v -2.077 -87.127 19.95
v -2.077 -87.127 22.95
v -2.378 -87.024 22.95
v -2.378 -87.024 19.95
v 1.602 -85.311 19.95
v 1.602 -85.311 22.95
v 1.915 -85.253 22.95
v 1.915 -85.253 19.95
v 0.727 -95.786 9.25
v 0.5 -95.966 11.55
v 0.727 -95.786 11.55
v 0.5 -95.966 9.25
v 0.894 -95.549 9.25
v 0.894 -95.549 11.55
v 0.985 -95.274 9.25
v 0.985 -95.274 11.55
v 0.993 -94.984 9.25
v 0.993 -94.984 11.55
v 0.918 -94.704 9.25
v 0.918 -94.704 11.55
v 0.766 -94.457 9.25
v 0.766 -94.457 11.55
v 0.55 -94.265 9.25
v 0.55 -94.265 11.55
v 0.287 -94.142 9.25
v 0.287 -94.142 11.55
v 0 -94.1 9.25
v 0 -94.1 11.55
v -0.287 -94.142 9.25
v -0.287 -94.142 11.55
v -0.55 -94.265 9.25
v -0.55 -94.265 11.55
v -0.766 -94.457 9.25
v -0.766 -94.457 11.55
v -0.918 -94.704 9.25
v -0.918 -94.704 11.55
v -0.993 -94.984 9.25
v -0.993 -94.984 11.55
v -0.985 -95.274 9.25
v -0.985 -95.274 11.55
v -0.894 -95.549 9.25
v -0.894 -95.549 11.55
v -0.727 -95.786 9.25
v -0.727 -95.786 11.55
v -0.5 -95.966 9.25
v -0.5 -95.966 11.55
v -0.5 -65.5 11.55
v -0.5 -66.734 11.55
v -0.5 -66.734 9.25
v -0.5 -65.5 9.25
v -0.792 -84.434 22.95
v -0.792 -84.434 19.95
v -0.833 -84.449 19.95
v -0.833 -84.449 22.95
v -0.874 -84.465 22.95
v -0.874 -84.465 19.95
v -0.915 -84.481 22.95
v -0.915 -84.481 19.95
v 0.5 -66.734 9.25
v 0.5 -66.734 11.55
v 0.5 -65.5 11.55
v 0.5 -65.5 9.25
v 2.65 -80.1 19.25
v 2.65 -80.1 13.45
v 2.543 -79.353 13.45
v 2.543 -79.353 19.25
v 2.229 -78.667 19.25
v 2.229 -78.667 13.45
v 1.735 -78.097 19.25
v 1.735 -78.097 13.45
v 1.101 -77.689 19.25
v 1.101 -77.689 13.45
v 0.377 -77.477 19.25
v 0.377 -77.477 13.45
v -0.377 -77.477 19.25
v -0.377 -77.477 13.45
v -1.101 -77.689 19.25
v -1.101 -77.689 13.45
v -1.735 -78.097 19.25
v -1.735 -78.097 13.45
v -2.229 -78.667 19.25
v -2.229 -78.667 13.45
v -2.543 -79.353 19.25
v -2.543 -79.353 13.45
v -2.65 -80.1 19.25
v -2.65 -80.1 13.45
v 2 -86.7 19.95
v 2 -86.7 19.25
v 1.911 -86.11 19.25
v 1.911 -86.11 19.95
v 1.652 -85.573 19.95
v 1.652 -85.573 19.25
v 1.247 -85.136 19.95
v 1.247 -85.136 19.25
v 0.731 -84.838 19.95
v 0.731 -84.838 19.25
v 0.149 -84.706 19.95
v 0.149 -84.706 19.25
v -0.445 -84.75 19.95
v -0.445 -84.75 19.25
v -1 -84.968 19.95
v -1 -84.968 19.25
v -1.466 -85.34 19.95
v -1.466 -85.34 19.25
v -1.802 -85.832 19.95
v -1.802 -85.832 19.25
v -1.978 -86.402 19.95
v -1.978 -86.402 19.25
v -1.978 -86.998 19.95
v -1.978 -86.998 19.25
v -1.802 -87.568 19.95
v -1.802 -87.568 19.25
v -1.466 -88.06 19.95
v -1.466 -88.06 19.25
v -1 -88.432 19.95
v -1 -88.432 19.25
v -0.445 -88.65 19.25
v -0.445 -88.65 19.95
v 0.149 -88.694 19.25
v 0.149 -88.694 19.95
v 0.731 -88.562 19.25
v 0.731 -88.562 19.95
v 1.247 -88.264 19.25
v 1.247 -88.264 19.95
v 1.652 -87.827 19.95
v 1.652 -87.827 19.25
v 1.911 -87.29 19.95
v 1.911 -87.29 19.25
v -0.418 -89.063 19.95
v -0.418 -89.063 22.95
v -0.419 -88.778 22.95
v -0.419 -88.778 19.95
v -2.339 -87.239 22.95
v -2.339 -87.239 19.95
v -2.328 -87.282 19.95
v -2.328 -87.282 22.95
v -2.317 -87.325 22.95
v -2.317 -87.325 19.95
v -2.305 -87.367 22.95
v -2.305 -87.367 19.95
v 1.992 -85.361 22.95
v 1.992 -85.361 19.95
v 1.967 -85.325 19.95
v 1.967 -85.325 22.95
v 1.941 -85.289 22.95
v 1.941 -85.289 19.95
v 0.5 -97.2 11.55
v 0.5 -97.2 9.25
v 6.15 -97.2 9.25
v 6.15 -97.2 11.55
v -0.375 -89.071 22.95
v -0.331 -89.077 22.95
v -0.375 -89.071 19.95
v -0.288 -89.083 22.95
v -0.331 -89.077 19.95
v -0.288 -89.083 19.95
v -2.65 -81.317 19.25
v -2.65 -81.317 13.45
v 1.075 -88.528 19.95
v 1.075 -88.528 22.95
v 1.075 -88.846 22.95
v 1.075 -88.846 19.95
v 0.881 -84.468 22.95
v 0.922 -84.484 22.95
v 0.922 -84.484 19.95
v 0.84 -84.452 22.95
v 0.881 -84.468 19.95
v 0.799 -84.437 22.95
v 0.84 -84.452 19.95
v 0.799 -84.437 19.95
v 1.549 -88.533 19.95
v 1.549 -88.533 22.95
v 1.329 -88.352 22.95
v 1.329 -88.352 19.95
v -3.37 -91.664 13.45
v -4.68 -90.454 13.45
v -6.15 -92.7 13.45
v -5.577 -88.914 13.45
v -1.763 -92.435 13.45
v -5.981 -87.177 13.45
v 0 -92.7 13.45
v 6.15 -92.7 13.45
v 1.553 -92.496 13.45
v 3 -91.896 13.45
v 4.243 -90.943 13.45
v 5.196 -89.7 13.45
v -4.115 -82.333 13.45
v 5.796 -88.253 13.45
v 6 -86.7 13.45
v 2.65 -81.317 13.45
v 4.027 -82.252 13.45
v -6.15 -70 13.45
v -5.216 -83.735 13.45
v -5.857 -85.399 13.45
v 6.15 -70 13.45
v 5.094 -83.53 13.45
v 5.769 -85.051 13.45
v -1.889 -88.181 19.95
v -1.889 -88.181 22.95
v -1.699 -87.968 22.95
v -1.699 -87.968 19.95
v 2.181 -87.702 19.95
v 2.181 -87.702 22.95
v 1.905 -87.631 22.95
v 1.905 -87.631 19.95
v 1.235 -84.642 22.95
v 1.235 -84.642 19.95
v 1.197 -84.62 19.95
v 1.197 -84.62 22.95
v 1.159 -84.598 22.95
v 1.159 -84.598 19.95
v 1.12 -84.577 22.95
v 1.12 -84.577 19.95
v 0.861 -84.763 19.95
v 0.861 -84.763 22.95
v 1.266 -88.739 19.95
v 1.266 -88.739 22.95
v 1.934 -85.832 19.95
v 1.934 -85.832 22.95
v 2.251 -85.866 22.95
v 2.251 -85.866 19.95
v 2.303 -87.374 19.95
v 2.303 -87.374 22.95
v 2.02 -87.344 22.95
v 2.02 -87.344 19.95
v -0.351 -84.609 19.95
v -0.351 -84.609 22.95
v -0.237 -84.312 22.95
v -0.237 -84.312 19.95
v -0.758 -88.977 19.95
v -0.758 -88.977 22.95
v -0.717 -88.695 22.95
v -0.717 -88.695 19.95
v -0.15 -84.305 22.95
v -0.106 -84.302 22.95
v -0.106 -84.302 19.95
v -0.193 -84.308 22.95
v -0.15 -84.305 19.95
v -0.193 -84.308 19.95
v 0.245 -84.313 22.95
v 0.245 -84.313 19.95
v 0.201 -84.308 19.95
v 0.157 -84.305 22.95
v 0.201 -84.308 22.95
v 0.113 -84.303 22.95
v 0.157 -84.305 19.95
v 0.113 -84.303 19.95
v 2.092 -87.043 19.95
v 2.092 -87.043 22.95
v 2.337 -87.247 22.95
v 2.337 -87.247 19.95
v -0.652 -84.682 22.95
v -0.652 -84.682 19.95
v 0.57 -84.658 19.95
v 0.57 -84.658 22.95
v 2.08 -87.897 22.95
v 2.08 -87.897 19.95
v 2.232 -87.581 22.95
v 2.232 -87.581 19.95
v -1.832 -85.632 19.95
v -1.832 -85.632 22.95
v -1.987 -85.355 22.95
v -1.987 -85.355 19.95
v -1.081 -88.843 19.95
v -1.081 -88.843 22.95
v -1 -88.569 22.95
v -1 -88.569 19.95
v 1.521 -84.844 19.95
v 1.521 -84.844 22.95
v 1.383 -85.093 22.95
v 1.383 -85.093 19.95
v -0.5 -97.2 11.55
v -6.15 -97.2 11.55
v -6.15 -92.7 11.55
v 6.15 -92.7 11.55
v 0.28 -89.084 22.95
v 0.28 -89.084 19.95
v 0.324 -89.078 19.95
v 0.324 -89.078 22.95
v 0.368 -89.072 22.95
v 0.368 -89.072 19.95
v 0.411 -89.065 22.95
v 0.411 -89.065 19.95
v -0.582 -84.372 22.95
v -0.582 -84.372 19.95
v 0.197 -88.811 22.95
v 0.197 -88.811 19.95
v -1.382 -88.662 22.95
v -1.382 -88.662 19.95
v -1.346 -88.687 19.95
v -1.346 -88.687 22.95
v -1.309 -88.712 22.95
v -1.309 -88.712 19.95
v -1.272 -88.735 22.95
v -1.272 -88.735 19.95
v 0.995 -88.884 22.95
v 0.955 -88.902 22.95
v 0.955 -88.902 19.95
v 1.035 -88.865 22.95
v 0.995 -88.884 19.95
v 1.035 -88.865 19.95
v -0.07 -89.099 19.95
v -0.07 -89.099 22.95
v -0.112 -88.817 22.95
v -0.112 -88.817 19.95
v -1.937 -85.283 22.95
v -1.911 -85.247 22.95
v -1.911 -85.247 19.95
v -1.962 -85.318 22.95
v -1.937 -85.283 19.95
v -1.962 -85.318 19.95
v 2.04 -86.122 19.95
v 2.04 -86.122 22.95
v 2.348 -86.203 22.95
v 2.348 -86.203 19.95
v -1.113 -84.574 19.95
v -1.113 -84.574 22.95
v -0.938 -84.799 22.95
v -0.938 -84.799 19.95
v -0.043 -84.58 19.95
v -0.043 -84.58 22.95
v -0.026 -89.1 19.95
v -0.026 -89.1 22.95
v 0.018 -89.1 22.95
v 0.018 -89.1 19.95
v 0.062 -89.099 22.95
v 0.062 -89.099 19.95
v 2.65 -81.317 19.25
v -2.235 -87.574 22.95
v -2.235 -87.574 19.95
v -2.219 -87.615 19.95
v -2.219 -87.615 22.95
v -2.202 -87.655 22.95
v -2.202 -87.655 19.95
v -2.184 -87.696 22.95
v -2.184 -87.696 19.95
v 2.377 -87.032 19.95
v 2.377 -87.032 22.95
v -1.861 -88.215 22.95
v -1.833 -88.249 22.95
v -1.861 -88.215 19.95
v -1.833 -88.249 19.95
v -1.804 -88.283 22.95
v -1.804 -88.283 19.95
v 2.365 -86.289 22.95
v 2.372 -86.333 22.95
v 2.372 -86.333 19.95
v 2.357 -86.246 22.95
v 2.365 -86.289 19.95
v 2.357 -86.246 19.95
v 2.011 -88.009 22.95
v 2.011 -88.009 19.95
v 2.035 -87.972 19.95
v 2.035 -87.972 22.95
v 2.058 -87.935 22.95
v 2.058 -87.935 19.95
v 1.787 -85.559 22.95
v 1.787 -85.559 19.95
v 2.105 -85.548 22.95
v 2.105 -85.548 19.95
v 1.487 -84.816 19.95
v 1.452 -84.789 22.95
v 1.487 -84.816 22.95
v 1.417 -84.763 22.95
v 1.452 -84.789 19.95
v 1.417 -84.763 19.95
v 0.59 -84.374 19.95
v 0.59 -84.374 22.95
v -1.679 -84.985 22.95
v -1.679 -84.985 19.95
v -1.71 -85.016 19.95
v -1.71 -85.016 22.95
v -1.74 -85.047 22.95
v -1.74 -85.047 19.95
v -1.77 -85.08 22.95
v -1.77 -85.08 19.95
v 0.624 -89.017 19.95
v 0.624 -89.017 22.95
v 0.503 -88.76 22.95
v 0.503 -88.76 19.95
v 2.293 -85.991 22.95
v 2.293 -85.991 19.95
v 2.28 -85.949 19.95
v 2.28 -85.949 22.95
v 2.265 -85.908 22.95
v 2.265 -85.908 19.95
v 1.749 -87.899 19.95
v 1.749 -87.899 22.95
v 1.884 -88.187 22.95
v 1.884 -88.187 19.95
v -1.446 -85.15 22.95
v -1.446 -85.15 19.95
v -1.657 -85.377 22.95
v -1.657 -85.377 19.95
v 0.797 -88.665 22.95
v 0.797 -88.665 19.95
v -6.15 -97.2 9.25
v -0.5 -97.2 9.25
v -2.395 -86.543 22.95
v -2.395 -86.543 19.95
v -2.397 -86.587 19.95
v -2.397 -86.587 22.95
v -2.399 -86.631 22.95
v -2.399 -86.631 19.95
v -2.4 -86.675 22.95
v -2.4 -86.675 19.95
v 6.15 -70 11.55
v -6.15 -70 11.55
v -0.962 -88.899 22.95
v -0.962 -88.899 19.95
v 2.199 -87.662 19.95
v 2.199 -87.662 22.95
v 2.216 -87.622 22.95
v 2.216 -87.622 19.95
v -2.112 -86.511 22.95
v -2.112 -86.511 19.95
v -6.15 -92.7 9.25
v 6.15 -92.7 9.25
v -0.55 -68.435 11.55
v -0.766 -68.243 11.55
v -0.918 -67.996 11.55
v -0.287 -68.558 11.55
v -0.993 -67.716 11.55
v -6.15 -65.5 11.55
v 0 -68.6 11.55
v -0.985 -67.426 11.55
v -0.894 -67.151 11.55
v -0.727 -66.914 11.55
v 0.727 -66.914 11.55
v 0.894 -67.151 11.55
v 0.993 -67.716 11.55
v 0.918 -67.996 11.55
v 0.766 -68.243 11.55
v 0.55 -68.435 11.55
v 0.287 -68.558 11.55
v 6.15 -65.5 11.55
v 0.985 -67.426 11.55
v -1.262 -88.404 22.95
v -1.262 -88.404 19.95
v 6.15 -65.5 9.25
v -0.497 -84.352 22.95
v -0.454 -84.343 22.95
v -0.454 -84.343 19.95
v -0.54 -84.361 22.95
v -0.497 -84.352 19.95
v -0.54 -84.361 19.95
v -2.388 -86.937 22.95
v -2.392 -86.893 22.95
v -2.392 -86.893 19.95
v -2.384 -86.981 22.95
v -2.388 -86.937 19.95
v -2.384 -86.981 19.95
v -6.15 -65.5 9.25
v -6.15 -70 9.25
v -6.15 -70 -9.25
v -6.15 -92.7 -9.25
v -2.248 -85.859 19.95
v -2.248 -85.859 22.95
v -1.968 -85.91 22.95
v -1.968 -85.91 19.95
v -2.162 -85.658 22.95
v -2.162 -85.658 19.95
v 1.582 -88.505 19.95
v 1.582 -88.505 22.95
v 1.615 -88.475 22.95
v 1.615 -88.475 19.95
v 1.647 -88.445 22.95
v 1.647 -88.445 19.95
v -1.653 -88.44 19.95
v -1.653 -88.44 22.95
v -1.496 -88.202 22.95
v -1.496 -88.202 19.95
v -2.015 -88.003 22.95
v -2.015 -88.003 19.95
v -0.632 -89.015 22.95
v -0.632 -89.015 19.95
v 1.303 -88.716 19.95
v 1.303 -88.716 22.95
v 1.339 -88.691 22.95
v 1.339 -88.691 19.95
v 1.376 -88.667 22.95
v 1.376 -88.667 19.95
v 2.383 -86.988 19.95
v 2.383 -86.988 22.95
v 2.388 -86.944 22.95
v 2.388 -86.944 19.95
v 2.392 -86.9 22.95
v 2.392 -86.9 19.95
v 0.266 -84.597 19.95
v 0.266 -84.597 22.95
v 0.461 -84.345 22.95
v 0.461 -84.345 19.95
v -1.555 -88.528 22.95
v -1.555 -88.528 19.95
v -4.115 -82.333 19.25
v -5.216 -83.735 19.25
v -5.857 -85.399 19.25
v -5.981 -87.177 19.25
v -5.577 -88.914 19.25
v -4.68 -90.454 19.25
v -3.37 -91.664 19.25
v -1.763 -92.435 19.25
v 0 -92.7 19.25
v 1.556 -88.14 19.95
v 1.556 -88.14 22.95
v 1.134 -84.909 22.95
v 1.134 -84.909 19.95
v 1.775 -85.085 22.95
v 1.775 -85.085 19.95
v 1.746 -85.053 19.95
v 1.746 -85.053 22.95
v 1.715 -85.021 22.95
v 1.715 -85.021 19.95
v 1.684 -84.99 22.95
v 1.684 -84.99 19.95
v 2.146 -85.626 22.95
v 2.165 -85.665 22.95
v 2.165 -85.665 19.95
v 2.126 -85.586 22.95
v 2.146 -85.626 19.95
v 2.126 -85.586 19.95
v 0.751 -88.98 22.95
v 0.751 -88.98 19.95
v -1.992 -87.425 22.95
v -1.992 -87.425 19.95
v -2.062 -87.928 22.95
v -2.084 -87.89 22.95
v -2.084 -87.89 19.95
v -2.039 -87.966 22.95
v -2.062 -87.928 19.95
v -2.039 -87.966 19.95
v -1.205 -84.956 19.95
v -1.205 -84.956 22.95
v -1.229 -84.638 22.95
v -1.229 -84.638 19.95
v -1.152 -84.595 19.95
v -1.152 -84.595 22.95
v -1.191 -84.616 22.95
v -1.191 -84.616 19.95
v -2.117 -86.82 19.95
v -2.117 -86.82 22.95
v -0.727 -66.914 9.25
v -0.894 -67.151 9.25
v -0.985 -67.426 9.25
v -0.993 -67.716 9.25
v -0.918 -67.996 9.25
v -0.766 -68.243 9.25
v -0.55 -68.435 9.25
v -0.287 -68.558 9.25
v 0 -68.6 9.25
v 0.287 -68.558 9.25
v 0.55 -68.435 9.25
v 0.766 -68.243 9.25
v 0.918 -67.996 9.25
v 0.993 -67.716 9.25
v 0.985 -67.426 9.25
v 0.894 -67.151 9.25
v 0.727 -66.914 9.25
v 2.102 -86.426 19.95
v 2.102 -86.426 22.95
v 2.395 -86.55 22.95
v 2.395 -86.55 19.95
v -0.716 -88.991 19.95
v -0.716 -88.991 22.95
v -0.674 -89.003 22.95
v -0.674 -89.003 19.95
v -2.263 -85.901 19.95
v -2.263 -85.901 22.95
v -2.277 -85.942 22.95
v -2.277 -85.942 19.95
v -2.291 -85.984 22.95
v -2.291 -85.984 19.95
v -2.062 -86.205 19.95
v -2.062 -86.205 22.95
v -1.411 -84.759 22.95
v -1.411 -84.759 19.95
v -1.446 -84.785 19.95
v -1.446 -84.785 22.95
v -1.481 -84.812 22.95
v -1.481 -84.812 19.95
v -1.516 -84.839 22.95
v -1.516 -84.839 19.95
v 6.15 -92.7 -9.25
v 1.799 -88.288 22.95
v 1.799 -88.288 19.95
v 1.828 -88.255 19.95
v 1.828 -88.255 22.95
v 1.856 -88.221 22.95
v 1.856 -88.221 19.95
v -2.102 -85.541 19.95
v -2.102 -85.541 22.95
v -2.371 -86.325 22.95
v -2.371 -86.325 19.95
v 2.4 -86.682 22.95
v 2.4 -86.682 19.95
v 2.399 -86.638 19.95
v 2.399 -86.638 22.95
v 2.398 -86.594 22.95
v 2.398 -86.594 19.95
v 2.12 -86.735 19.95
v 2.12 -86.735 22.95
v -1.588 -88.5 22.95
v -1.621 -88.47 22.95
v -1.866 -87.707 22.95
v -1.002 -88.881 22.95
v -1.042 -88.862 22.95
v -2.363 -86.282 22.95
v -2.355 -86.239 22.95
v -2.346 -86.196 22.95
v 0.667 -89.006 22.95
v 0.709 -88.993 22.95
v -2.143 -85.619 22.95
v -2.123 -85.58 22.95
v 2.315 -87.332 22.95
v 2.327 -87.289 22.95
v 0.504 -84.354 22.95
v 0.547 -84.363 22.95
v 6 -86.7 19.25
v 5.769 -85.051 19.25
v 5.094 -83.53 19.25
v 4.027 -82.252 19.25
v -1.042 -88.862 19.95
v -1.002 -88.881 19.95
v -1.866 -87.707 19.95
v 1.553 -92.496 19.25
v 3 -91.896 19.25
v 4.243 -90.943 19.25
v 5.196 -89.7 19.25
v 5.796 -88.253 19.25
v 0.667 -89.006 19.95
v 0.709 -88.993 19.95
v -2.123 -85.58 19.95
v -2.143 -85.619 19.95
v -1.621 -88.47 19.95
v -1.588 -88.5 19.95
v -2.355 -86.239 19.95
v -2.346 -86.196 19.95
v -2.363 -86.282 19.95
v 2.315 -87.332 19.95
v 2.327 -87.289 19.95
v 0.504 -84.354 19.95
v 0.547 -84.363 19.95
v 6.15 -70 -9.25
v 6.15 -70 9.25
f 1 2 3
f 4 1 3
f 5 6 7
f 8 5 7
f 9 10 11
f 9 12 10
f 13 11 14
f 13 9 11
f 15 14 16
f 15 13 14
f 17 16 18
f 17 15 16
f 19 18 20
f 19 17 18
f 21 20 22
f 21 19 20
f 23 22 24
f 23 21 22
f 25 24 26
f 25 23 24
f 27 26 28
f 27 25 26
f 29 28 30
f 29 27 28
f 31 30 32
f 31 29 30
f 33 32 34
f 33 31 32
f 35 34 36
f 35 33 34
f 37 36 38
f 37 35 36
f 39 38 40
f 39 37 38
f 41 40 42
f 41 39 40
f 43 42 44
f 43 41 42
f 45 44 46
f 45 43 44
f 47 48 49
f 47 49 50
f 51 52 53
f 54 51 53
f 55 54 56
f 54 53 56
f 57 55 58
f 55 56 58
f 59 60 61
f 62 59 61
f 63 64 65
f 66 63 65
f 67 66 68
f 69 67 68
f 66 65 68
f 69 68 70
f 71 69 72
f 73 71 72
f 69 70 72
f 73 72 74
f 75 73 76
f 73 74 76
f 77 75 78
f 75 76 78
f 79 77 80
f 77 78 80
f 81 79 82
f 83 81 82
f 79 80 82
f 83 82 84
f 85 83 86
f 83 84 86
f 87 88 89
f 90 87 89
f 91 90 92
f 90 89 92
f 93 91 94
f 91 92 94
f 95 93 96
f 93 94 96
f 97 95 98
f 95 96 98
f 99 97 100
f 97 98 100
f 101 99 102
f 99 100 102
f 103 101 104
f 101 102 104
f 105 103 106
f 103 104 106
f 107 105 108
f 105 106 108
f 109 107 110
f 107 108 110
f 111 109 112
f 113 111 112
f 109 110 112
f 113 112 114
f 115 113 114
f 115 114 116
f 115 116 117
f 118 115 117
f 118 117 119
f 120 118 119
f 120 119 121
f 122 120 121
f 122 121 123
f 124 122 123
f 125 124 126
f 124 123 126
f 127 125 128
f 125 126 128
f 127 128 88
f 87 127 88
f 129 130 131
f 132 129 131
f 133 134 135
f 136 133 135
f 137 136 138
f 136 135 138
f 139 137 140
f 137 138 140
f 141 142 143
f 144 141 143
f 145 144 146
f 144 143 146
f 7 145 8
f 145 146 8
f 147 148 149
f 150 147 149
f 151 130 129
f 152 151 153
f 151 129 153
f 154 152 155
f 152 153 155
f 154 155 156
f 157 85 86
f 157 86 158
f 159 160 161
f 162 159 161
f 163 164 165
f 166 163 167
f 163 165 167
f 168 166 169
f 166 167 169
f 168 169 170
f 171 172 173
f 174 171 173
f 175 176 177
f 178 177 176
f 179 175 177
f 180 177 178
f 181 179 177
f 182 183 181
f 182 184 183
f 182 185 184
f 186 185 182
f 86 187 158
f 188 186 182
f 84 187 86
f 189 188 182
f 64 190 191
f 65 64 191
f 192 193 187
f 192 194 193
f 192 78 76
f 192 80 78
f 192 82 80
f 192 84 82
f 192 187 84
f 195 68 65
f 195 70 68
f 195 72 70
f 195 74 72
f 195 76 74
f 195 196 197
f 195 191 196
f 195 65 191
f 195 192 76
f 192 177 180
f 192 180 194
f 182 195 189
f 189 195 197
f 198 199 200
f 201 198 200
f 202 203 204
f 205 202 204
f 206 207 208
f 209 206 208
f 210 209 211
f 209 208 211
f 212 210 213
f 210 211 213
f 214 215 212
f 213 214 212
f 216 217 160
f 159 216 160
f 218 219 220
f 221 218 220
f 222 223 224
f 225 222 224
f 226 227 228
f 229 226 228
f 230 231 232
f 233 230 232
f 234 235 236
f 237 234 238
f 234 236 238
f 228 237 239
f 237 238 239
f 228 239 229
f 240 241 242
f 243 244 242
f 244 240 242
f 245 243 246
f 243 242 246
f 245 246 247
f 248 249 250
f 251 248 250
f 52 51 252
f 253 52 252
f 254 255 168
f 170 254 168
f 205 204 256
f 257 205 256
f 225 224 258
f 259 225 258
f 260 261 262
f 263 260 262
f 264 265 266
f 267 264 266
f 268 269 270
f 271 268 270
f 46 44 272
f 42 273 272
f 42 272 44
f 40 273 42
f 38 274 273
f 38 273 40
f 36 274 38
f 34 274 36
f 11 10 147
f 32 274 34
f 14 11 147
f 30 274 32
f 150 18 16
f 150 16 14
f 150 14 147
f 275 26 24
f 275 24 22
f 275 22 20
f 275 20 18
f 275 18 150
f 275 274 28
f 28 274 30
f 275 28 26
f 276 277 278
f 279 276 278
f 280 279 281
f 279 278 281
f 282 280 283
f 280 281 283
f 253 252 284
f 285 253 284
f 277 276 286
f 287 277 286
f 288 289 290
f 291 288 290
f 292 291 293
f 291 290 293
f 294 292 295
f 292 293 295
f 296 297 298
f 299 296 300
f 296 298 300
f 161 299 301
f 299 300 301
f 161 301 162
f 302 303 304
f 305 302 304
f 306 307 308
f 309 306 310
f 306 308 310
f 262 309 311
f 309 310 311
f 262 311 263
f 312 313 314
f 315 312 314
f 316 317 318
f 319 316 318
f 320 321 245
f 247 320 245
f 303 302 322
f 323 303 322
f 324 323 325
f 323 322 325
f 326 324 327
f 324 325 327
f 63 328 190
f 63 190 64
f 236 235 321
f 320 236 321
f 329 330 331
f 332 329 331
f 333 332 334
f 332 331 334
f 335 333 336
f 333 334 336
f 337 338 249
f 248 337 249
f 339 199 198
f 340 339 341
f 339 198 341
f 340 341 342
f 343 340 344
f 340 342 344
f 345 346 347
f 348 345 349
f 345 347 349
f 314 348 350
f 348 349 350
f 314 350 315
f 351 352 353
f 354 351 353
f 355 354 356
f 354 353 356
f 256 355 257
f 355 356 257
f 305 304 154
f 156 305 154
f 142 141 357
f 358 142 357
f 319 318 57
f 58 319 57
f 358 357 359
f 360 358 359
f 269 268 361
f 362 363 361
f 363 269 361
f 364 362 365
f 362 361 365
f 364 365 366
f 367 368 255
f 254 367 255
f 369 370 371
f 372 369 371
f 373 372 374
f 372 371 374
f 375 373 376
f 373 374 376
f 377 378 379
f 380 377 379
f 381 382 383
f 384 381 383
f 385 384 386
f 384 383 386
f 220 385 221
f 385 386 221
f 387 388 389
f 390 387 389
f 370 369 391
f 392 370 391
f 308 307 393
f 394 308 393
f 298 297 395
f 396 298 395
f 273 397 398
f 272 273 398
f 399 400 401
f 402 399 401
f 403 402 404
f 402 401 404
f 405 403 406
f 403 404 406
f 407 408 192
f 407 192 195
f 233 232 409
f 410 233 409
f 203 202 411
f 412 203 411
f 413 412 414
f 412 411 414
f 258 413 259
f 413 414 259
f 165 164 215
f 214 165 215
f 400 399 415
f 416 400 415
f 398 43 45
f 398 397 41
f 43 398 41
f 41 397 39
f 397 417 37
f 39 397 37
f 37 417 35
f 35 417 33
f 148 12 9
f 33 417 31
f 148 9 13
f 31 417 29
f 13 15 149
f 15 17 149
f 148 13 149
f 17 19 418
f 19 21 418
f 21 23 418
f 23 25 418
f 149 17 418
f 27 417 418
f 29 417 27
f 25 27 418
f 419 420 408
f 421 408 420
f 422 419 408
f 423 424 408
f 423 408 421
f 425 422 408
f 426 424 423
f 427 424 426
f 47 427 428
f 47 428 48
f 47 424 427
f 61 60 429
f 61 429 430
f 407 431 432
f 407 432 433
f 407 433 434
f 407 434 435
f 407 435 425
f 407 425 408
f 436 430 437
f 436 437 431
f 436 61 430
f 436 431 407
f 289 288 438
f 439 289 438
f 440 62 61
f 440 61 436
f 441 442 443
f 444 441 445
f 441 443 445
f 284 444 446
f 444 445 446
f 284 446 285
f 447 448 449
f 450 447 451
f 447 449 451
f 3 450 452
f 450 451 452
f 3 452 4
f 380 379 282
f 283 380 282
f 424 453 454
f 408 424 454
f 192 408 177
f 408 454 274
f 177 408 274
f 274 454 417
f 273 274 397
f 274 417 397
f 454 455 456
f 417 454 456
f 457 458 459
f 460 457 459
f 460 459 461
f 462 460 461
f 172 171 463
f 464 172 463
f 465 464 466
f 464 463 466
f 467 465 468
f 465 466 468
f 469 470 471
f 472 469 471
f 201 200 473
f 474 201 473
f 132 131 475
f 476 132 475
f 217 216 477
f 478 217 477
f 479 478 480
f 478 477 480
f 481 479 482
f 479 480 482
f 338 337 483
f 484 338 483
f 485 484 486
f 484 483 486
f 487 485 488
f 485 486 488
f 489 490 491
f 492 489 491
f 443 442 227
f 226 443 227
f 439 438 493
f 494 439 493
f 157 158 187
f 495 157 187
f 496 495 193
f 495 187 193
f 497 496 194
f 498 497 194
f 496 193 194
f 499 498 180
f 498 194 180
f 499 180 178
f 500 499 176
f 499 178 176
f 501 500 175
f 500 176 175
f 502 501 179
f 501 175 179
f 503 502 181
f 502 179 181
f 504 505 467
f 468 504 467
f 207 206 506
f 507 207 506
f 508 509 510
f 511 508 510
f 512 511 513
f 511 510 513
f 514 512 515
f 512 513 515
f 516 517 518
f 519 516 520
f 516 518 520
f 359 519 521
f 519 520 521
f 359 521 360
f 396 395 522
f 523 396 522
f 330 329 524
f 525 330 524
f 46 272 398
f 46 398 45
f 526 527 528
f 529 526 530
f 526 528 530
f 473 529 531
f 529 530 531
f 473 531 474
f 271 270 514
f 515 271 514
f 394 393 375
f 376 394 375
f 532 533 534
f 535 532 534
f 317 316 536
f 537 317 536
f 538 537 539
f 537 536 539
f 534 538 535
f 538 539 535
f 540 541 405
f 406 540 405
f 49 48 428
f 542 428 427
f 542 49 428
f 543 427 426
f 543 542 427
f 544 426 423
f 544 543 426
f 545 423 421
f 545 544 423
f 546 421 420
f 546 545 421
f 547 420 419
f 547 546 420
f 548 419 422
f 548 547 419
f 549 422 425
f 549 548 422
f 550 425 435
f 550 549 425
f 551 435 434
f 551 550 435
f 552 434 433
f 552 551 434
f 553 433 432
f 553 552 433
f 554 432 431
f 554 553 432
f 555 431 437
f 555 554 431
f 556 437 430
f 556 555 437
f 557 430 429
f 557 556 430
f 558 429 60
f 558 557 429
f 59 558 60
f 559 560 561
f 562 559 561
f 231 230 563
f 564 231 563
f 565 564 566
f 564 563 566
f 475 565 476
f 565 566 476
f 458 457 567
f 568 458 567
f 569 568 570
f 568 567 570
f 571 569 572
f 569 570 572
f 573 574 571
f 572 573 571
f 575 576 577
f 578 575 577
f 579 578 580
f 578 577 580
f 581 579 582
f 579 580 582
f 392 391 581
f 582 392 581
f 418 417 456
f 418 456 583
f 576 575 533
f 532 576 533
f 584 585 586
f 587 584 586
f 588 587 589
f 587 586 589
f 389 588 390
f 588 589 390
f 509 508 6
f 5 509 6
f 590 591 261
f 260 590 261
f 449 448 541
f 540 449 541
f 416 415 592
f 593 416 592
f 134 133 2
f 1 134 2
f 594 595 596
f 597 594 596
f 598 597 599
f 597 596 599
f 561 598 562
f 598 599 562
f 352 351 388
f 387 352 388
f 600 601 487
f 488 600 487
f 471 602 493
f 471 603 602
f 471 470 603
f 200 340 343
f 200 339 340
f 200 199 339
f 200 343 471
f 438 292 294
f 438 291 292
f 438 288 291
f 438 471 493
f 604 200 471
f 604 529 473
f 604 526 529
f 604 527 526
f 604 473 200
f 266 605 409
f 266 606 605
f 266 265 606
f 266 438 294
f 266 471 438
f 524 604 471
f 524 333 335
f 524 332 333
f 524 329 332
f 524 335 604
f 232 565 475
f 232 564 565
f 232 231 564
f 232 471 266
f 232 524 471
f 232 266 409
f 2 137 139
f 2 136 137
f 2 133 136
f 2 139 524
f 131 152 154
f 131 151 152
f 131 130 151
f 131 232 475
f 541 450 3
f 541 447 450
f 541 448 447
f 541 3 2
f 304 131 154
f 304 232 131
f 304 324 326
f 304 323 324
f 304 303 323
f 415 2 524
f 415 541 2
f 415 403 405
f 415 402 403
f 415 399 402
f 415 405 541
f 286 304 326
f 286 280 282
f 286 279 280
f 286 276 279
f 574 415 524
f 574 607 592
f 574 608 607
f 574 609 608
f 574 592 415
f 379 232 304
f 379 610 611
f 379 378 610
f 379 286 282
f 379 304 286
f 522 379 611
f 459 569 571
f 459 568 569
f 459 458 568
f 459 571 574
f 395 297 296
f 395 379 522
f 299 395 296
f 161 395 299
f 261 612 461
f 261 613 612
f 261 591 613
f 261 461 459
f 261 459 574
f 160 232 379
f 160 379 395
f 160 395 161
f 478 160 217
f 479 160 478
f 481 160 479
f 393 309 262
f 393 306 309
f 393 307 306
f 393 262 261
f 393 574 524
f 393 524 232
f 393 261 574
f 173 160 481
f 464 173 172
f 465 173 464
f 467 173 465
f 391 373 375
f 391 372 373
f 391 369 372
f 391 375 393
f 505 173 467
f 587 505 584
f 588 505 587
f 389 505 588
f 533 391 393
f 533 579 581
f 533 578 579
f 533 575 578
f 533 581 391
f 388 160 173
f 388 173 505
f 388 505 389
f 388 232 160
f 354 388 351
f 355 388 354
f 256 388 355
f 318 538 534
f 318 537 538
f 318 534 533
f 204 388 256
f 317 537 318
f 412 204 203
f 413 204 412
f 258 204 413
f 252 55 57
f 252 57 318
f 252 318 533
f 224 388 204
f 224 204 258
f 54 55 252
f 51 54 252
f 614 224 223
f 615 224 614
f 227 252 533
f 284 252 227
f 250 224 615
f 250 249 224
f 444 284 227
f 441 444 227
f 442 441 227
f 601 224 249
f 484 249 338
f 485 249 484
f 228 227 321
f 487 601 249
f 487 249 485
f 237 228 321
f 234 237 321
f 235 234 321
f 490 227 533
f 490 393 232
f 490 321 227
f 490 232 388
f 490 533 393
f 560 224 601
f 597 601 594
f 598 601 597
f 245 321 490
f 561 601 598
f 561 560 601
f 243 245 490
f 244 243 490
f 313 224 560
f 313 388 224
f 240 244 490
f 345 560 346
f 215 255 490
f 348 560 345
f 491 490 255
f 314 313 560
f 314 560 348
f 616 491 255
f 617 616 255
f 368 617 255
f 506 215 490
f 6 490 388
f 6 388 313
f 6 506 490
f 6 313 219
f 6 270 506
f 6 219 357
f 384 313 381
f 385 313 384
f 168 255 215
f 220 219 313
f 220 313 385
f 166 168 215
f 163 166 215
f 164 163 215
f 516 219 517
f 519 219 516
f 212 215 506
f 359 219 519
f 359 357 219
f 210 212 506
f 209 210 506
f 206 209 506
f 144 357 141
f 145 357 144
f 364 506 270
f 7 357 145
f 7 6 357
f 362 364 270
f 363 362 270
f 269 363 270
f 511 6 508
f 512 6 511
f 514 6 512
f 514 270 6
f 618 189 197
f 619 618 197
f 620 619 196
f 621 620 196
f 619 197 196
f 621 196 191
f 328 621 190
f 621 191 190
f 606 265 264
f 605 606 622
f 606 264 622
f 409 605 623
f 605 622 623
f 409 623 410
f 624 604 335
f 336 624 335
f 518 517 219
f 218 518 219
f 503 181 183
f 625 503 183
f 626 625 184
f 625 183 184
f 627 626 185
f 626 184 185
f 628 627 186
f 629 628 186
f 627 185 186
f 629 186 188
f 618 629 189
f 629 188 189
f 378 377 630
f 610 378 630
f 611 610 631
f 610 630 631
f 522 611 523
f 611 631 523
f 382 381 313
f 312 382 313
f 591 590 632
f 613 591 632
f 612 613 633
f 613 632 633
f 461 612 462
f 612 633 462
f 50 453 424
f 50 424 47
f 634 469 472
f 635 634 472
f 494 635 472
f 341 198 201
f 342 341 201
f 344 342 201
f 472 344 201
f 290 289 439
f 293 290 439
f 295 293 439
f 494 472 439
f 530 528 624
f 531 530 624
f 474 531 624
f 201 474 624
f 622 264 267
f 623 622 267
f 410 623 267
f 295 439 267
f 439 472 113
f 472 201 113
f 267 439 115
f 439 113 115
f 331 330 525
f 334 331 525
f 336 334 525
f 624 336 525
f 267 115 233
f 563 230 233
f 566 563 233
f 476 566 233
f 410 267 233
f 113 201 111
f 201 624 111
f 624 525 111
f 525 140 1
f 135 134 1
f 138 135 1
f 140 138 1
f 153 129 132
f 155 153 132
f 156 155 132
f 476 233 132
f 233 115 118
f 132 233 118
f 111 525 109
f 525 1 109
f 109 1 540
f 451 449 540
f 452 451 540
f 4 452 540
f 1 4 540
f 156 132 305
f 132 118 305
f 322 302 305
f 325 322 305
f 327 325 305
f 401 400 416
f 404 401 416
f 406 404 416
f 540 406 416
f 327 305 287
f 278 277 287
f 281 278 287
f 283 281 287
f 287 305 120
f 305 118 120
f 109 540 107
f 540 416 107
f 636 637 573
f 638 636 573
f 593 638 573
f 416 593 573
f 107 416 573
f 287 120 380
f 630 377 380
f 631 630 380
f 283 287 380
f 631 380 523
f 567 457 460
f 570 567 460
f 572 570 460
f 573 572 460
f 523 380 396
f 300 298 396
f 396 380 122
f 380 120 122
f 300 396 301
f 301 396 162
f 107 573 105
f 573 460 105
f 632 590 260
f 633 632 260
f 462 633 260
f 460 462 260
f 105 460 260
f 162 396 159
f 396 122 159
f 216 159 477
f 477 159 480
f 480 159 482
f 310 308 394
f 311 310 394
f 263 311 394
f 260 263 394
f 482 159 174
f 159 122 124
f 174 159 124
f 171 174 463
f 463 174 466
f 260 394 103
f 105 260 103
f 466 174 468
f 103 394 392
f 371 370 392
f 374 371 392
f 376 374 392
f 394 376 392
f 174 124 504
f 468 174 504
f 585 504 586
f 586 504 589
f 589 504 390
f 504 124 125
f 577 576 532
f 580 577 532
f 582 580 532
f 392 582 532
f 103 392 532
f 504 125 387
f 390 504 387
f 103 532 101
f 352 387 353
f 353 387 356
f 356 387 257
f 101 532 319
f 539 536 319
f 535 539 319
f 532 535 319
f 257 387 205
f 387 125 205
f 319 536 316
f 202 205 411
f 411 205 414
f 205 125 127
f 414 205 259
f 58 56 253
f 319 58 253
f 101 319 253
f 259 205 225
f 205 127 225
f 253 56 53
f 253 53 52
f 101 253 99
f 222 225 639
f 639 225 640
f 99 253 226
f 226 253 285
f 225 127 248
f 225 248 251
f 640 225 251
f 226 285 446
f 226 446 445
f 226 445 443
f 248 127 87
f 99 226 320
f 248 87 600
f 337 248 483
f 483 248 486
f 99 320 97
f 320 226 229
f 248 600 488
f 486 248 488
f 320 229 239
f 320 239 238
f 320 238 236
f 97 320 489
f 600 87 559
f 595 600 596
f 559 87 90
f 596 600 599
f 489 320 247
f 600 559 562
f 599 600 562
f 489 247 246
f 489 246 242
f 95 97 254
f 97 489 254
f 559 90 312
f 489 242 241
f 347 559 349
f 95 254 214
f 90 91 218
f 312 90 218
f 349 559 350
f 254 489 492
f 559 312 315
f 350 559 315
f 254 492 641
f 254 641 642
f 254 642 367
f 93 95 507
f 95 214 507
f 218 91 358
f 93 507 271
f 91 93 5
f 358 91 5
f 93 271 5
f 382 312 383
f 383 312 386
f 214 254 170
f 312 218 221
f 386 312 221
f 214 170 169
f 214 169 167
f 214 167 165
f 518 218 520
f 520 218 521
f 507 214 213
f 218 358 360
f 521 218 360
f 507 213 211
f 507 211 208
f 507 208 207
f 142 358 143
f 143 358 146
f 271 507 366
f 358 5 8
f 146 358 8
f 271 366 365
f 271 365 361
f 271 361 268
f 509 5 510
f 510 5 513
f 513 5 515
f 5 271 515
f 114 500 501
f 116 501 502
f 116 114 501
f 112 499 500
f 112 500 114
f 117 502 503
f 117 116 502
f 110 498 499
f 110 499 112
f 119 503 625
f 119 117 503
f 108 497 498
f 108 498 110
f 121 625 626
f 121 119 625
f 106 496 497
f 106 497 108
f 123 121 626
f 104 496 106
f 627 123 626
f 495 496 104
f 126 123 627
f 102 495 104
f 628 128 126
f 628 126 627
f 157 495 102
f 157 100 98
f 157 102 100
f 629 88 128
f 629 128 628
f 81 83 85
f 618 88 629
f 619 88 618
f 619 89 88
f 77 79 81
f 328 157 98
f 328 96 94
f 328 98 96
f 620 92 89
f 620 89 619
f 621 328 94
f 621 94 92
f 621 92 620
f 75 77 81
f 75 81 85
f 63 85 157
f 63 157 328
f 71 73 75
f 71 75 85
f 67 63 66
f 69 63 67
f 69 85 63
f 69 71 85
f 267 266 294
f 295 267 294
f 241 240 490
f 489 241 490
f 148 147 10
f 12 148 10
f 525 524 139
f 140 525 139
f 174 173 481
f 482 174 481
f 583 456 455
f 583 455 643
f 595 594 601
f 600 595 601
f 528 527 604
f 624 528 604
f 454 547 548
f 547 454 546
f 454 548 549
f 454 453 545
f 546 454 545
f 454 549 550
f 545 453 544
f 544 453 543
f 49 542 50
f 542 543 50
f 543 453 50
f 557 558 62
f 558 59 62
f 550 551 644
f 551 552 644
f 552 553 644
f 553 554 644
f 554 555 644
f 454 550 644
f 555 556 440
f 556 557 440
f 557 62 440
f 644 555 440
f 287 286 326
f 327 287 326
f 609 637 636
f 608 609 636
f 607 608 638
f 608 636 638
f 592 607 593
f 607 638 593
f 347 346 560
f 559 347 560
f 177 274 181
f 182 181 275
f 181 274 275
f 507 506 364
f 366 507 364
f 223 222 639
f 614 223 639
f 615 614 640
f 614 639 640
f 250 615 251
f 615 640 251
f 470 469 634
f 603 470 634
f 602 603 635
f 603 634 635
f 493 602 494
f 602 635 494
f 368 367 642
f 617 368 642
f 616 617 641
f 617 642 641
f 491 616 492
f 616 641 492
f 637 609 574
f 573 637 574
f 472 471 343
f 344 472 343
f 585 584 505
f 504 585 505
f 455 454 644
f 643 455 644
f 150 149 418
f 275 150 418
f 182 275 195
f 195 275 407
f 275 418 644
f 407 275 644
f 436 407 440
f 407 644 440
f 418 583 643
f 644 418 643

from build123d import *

# Parameters (mm, degrees)
F1_W      = 12.3
F1_H      = 18.5
F2_DEPTH  = 22.7
F3_W      = 12.3
F3_H      = 22.7
F3_H_2    = 4.5
F3_R      = 1
F4_DEPTH  = 2.3
F5_W      = 1
F5_H      = 3.3
F6_DEPTH  = 20.801
F7_W      = 12.3
F7_H      = 22.7
F8_DEPTH  = 1.9
F10_DEPTH = 5.8
F11_R     = 2
F12_DEPTH = 0.7
F13_R     = 2.4
F13_R_2   = 2
F14_DEPTH = 3
F16_DEPTH = 3.7
F17_COUNT = 43


# Not quite as in the source:
# - a feature names something its author has since deleted; it is built from what else it names


with BuildPart() as f2:
    # F1 (on offset) → F2 (new body)
    with BuildSketch(Plane.XZ.offset(70)):
        Rectangle(F1_W, F1_H)
    extrude(amount=F2_DEPTH)

    # F3 (on face) → F4 (join)
    with BuildSketch(Plane.XY.offset(9.25)):
        with Locations((0, -81.35)):
            Rectangle(F3_W, F3_H)
        with Locations((0, -67.75)):
            Rectangle(F3_W, F3_H_2)
        with Locations((0, -67.6)):
            Circle(F3_R, mode=Mode.SUBTRACT)
        with Locations((0, -94.95)):
            Rectangle(F3_W, F3_H_2)
        with Locations((0, -95.1)):
            Circle(F3_R, mode=Mode.SUBTRACT)
    extrude(amount=F4_DEPTH)

    # F5 (on face) → F6 (cut, through all)
    with BuildSketch(Plane.XY.offset(11.55)):
        with Locations((0, -65.5)):
            Rectangle(F5_W, F5_H)
        with Locations((0, -97.2)):
            Rectangle(F5_W, F5_H)
    extrude(amount=-F6_DEPTH, mode=Mode.SUBTRACT)

    # F7 (on face) → F8 (join)
    with BuildSketch(Plane.XY.offset(11.55)):
        with Locations((0, -81.35)):
            Rectangle(F7_W, F7_H)
    extrude(amount=F8_DEPTH)

    # F9 (on face) → F10 (join)
    with BuildSketch(Plane.XY.offset(13.45)):
        with BuildLine():
            ThreePointArc((0, -92.7), (4.2426406871, -90.9426406871), (6, -86.7))
            ThreePointArc((6, -86.7), (5.0941142508, -83.5298265032), (2.65, -81.3169246708))
            ThreePointArc((2.65, -81.3169246708), (0, -80.7), (-2.65, -81.3169246708))
            ThreePointArc((-2.65, -81.3169246708), (-5.843733908, -88.0604315537), (0, -92.7))
        make_face()
        with BuildLine():
            ThreePointArc((-2.65, -81.3169246708), (0, -80.7), (2.65, -81.3169246708))
            Line((2.65, -81.3169246708), (2.65, -80.1))
            ThreePointArc((2.65, -80.1), (0, -77.45), (-2.65, -80.1))
            Line((-2.65, -80.1), (-2.65, -81.3169246708))
        make_face()
    extrude(amount=F10_DEPTH)



with BuildPart() as f12:
    # F11 (on face) → F12 (new body)
    with BuildSketch(Plane.XY.offset(19.25)):
        with Locations((0, -86.7)):
            Circle(F11_R)
    extrude(amount=F12_DEPTH)


with BuildPart() as f2_1:
    add(f2.part)

    add(f12.part)  # F14 merges F12
    # F13 (on face) → F14 (join)
    with BuildSketch(Plane.XY.offset(19.95)):
        with Locations((0, -86.7)):
            Circle(F13_R)
        with Locations((0, -86.7)):
            Circle(F13_R_2, mode=Mode.SUBTRACT)
        with Locations((0, -86.7)):
            Circle(F13_R_2)
    extrude(amount=F14_DEPTH)

    # F17: F16 ×43 about axis
    f17_axis = Axis((0, -86.7, 22.95), (0, 0, 1))


with BuildPart() as f16:
    # F15 (on face) → F16 (new body, through all)
    with BuildSketch(Plane.XY.offset(22.95)):
        with BuildLine():
            ThreePointArc((1.4170132697, -84.7629730529), (1.3273305991, -84.7004516808), (1.2348937398, -84.6420793379))
            Line((1.2348937398, -84.6420793379), (1.1339585762, -84.9085450172))
            Line((1.1339585762, -84.9085450172), (1.4170132697, -84.7629730529))
        make_face()
    extrude(amount=-F16_DEPTH)


with BuildPart() as f2_2:
    add(f2_1.part)
    for i in range(1, F17_COUNT):
        add(f16.part.rotate(f17_axis, i * 360 / F17_COUNT), mode=Mode.SUBTRACT)

    # F17#seed: cut F16
    add(f16.part, mode=Mode.SUBTRACT)


solid = f2_2.part
